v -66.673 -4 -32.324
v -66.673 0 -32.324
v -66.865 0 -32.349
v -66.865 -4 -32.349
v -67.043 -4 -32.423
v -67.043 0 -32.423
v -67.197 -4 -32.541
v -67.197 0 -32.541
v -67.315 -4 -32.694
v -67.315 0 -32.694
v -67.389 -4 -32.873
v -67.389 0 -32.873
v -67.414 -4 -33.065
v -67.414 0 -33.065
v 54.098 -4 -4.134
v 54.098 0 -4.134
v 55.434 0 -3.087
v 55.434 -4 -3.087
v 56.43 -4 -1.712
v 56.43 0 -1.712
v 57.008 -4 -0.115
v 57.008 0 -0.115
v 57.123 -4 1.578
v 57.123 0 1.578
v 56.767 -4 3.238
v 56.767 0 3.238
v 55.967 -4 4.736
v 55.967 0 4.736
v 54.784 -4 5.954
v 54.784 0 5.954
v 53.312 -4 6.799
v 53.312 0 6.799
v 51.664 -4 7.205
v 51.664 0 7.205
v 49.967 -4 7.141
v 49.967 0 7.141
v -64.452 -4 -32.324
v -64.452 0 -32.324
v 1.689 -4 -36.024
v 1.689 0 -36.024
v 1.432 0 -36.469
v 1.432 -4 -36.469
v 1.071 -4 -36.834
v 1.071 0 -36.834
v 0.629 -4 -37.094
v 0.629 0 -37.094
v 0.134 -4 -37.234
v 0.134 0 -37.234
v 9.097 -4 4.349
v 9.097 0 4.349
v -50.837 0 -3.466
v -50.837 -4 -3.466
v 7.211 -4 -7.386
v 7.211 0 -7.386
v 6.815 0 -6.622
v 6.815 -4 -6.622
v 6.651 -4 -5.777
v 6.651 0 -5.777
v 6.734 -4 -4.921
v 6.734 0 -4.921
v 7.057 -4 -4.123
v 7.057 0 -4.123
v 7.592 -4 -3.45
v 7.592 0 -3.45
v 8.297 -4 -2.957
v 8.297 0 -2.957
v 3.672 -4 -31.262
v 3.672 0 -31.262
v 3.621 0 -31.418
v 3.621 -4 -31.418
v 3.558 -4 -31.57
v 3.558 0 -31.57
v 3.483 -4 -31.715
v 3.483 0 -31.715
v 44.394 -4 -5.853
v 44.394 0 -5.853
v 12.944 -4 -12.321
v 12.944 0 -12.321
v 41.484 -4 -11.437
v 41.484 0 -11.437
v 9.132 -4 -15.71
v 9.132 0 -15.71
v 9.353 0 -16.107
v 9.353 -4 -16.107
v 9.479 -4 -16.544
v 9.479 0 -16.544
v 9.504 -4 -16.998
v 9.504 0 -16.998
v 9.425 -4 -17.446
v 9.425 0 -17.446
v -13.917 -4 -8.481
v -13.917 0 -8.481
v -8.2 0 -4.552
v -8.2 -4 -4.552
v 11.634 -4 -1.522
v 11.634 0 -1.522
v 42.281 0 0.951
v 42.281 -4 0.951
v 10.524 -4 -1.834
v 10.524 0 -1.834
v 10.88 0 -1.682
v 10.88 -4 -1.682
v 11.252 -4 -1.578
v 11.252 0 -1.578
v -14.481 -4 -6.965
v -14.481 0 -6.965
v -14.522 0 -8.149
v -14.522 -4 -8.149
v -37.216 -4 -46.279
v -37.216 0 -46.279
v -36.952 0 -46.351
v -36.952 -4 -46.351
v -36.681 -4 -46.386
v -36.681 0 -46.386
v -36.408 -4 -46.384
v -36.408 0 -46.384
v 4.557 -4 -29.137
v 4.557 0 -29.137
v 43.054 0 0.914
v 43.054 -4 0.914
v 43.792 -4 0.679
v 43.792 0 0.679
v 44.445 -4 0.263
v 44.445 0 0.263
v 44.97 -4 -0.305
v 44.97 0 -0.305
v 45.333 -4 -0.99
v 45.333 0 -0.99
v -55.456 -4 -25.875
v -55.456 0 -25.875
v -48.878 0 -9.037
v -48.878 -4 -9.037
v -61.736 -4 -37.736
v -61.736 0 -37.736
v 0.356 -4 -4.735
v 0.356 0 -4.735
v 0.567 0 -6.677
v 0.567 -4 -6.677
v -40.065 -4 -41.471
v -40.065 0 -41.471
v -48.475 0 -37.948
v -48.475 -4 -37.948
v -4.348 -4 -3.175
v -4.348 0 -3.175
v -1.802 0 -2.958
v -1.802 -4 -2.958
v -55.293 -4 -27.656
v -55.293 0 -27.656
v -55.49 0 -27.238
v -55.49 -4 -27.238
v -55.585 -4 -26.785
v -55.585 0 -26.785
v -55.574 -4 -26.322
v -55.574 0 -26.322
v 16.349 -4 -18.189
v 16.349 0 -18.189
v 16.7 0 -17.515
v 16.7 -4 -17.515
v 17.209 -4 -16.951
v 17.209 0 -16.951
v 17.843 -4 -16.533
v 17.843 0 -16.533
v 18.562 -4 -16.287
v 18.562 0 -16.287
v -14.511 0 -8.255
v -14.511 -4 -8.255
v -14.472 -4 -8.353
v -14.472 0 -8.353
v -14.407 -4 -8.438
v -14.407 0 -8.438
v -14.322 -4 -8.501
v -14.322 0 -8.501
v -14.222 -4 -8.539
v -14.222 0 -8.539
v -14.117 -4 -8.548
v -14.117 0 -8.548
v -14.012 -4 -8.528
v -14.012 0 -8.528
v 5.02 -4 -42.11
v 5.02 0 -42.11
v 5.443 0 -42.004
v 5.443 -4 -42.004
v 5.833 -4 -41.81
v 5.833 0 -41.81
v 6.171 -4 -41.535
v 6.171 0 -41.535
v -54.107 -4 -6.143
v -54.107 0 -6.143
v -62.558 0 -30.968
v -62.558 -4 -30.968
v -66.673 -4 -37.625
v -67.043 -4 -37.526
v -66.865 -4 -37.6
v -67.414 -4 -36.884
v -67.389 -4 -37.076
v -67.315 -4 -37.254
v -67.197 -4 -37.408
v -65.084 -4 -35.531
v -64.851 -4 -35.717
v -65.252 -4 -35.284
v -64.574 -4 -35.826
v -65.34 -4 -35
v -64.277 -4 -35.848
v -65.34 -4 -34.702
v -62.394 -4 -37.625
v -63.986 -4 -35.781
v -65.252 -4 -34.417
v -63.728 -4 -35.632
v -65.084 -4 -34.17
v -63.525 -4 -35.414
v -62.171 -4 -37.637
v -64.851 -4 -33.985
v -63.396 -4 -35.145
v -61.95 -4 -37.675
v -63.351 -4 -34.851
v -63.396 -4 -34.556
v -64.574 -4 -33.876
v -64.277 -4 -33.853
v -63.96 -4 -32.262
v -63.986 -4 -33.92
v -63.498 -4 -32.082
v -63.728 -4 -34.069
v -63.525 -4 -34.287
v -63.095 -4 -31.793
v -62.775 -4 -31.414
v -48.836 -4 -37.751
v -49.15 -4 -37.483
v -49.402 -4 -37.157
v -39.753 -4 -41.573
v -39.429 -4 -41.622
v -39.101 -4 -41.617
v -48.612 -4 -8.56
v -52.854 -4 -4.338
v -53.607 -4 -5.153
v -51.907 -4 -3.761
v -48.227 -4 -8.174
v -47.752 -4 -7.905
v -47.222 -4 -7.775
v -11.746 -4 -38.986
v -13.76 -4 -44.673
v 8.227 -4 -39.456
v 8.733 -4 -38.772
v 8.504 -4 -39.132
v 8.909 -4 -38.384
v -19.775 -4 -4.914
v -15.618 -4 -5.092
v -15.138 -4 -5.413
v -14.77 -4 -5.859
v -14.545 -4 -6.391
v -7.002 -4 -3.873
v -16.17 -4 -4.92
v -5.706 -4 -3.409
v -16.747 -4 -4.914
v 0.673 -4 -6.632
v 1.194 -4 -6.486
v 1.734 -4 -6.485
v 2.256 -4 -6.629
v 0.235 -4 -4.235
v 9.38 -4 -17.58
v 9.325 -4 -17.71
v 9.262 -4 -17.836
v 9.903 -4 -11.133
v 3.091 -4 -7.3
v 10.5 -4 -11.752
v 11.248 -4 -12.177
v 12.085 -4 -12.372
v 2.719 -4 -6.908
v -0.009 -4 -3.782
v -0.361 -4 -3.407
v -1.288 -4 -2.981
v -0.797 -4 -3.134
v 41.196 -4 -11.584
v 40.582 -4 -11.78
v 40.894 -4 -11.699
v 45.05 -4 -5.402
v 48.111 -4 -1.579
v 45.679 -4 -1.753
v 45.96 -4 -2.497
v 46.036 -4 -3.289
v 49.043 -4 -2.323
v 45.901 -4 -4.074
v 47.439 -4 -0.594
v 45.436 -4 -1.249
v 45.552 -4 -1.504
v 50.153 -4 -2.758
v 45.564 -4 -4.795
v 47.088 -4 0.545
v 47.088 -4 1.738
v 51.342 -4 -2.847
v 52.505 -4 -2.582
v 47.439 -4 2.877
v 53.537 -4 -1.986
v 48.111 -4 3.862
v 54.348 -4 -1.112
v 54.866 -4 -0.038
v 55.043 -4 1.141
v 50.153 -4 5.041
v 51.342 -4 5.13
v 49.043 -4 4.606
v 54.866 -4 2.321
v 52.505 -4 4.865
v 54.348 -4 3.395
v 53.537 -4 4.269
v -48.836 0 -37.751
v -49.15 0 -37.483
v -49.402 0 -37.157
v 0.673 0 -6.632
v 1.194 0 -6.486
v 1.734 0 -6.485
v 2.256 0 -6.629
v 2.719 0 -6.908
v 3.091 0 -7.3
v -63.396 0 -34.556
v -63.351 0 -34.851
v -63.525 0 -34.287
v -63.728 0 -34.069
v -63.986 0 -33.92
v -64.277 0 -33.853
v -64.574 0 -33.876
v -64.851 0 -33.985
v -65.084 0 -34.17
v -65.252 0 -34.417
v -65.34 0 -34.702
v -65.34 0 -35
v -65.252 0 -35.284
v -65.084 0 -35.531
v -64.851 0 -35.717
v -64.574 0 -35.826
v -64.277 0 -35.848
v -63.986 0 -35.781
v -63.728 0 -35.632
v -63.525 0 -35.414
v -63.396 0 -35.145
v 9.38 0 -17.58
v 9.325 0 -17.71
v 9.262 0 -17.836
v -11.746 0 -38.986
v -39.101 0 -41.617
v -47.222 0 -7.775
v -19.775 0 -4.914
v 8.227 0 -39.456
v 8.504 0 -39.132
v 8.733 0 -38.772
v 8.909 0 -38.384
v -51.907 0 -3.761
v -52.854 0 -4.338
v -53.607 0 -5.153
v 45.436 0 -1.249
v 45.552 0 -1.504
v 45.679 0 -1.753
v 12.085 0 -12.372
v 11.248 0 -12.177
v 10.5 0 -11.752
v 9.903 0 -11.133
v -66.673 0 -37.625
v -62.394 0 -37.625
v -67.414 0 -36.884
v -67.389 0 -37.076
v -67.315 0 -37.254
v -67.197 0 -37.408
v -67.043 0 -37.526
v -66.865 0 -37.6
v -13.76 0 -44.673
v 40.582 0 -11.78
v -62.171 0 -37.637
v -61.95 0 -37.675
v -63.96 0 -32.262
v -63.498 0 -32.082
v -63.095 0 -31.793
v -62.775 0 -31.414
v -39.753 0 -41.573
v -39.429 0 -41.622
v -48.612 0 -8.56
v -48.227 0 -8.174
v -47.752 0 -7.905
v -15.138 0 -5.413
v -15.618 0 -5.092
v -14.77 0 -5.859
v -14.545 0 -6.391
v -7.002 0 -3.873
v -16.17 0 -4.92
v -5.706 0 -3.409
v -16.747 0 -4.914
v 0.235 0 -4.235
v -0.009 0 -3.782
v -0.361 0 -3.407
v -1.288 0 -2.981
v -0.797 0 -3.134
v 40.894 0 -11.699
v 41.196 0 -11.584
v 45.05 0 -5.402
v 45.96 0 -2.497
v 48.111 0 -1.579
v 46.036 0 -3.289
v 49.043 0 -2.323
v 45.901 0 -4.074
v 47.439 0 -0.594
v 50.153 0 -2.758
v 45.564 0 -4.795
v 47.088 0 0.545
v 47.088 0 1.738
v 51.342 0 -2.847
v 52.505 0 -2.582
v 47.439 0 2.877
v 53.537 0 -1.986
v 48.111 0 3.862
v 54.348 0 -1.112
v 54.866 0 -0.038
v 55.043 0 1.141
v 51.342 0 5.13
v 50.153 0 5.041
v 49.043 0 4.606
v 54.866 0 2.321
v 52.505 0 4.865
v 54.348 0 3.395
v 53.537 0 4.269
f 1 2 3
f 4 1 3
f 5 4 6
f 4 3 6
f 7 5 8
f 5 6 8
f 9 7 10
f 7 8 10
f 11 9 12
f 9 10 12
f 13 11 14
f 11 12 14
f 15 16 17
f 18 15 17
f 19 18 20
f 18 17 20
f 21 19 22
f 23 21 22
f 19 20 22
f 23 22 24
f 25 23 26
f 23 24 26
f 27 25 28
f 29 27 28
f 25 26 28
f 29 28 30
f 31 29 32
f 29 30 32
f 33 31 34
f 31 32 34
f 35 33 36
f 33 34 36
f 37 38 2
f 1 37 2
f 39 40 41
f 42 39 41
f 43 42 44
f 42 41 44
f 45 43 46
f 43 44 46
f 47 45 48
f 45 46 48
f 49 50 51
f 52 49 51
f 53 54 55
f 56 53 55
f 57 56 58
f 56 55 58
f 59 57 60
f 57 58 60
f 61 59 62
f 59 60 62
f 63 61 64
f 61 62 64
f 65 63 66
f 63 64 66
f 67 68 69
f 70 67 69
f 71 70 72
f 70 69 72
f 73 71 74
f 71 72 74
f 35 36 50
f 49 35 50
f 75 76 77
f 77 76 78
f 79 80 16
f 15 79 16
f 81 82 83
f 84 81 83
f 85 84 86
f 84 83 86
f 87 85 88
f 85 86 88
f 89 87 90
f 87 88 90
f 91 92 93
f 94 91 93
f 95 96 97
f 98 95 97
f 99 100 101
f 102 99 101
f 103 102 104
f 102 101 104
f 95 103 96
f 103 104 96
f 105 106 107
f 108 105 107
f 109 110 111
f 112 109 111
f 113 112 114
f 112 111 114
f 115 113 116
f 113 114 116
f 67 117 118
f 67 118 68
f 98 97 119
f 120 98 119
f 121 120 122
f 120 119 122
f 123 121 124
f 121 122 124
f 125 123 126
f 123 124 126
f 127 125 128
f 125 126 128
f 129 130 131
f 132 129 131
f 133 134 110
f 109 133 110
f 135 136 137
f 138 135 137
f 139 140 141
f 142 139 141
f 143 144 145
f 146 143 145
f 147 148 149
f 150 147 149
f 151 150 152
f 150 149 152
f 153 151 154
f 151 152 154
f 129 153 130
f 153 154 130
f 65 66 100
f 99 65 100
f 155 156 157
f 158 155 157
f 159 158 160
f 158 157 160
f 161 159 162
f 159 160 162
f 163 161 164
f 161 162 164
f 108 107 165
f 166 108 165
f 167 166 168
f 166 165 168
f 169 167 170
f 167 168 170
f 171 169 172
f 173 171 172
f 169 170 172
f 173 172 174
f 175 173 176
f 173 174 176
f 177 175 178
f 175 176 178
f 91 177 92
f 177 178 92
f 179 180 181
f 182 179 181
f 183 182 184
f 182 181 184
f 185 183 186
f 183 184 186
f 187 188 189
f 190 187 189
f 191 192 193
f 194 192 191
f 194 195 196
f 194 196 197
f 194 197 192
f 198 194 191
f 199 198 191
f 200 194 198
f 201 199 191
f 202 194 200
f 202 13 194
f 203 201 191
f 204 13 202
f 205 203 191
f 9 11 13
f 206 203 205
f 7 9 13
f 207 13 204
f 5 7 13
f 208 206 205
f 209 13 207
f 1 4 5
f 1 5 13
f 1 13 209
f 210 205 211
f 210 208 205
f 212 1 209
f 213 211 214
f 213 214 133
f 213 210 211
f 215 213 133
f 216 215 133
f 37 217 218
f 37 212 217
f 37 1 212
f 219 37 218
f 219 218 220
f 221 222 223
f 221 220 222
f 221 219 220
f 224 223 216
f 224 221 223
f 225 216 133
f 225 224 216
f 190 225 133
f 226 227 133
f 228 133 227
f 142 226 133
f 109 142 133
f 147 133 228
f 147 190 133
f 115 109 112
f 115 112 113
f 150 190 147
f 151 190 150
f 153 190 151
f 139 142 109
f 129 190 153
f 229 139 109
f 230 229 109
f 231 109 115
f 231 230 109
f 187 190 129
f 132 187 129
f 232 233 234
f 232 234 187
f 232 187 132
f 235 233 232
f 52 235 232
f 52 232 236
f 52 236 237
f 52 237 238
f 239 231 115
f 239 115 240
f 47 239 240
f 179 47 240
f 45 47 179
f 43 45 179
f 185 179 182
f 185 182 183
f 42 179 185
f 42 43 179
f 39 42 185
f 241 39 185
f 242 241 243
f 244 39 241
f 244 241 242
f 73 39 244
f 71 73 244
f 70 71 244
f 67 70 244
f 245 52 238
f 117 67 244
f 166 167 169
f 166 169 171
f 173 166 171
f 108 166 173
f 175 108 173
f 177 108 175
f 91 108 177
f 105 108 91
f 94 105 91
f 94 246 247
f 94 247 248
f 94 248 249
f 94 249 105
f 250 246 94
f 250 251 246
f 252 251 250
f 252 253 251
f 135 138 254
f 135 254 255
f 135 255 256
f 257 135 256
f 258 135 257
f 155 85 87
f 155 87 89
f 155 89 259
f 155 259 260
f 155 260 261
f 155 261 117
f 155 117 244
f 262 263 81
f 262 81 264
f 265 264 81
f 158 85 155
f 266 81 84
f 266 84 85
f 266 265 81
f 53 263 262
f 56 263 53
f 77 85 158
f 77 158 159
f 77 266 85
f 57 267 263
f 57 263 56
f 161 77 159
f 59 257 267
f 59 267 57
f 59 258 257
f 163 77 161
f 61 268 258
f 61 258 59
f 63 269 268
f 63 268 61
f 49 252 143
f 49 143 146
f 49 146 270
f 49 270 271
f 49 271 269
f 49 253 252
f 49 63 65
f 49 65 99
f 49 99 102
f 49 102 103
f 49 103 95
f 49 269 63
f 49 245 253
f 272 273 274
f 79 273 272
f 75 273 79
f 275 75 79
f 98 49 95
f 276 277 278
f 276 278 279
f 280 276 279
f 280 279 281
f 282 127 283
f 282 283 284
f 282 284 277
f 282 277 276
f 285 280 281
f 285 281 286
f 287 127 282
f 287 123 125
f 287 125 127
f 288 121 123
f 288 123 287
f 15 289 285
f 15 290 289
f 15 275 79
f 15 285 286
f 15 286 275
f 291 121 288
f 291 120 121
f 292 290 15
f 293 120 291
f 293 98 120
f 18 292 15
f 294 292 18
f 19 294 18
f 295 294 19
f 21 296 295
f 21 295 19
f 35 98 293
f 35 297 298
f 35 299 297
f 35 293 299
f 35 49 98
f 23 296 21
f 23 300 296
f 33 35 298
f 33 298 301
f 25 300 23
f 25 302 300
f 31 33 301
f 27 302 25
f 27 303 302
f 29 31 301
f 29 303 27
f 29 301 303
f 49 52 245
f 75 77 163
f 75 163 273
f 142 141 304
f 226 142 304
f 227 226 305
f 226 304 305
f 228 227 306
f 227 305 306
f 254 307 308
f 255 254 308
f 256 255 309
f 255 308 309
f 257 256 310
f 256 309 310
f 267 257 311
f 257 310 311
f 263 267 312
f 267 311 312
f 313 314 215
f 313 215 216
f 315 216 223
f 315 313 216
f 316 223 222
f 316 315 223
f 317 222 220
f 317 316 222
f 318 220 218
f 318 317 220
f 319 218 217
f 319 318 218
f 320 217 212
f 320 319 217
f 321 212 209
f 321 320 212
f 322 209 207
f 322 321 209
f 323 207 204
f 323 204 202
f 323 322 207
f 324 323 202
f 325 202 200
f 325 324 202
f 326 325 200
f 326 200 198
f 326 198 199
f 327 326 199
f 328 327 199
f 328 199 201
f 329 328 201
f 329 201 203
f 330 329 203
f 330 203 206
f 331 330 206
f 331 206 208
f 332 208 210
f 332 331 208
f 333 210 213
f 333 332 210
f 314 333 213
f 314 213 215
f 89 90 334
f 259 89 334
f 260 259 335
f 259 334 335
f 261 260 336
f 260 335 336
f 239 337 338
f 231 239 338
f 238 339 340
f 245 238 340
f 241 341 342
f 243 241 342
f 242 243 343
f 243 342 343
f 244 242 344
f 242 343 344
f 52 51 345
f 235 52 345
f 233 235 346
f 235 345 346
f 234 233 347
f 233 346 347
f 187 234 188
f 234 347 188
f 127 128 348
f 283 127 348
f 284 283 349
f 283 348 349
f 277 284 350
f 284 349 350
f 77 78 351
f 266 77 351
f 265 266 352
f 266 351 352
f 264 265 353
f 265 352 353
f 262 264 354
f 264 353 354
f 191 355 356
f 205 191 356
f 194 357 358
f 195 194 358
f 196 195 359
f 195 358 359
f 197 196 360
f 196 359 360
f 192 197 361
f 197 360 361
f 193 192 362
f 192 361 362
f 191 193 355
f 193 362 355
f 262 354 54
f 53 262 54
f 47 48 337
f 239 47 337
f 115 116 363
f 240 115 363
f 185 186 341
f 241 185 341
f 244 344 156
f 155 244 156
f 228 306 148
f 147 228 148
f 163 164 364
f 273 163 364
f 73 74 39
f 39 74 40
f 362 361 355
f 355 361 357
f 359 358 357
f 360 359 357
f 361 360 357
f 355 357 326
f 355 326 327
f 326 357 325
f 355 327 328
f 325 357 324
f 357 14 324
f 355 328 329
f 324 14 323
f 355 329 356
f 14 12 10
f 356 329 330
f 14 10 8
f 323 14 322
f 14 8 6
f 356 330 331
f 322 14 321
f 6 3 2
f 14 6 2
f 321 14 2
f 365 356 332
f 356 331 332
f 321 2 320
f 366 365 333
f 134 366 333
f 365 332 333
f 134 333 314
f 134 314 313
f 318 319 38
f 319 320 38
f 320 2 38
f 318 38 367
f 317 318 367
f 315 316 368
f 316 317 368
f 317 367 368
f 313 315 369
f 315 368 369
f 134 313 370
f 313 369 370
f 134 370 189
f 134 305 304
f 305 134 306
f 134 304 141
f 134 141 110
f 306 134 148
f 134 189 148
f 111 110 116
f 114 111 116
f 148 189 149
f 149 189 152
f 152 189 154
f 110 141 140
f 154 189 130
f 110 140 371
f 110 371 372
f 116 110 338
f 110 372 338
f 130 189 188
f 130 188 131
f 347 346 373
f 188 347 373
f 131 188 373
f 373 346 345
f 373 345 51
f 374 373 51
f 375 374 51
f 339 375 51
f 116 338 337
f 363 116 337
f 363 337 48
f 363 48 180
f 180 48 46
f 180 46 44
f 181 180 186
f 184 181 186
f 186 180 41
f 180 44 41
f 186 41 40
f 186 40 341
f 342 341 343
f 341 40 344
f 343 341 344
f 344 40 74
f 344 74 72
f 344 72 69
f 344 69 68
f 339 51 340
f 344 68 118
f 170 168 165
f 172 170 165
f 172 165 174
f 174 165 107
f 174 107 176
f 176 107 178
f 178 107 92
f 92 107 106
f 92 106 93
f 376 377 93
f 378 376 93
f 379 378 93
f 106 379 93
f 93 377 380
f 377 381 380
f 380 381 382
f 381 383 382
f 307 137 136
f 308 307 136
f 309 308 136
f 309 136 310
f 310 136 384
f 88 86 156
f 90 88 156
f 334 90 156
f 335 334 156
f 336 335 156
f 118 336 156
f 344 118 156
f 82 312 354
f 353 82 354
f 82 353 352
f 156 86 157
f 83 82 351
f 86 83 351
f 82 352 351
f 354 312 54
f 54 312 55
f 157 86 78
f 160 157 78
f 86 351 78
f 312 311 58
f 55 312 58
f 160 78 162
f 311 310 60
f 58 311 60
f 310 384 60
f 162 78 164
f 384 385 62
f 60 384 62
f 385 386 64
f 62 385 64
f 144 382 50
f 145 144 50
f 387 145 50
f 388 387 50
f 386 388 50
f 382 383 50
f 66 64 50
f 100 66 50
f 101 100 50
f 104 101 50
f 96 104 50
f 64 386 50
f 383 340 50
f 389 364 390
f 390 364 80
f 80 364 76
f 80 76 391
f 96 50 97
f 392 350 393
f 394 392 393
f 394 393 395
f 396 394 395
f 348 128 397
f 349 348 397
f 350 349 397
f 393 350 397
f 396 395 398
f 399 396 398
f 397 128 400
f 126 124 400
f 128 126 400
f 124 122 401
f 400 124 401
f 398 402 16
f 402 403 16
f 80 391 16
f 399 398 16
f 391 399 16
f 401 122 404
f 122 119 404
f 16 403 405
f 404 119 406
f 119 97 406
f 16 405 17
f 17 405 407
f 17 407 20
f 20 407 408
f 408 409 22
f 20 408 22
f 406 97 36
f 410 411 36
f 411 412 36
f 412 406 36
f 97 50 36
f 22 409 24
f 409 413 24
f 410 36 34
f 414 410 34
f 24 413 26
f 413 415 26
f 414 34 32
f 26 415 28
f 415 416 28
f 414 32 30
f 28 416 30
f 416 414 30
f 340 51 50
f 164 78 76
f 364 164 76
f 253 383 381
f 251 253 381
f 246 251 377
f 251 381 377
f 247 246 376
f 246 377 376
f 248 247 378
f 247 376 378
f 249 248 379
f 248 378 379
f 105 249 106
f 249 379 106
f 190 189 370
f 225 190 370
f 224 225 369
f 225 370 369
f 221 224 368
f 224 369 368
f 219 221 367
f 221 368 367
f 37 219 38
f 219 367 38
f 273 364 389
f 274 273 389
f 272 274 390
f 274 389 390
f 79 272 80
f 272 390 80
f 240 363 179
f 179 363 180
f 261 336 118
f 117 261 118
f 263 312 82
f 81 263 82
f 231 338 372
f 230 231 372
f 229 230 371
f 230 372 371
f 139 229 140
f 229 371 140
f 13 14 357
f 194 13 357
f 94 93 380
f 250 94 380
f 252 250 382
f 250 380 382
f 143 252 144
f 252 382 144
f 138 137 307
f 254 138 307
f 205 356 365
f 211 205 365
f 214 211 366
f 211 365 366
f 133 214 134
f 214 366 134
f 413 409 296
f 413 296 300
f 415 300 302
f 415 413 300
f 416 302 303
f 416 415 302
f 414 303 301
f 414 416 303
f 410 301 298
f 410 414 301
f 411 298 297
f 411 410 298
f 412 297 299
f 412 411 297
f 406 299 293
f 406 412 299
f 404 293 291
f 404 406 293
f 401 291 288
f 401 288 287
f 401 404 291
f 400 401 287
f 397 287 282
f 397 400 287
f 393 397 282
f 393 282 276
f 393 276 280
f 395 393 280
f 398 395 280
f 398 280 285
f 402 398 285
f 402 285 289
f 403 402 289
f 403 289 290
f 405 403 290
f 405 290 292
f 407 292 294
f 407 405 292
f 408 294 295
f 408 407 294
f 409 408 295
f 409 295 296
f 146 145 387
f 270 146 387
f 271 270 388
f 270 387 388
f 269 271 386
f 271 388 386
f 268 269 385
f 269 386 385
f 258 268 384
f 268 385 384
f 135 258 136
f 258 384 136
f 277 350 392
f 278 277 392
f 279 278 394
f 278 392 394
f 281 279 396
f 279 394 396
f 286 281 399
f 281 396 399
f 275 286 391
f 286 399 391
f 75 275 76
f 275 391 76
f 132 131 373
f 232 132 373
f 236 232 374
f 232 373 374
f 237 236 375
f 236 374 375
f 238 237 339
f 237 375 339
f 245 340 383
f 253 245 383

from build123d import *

# Parameters (mm, degrees)
F1_R     = 1
F1_R_2   = 4
F2_DEPTH = 4


# Not quite as in the source:
# - a feature names something its author has since deleted; it is built from what else it names


with BuildPart() as f2:
    # F1 (on Front) → F2 (new body)
    with BuildSketch(Plane.XZ):
        with BuildLine():
            ThreePointArc((54.0977004839, -4.1335701552), (56.766858502, 3.238282099), (49.9672364551, 7.1413258089))
            Line((49.9672364551, 7.1413258089), (9.0970295176, 4.3491148777))
            Line((9.0970295176, 4.3491148777), (-50.8374237274, -3.466212469))
            ThreePointArc((-50.8374237274, -3.466212469), (-52.8544943464, -4.3378942821), (-54.1067810637, -6.1434914253))
            Line((-54.1067810637, -6.1434914253), (-62.5583549212, -30.968136056))
            ThreePointArc((-62.5583549212, -30.968136056), (-63.2874110026, -31.9497789492), (-64.4516400514, -32.3235653341))
            Line((-64.4516400514, -32.3235653341), (-66.6727852076, -32.3235653341))
            ThreePointArc((-66.6727852076, -32.3235653341), (-67.1968351707, -32.5406339362), (-67.4139037728, -33.0646838993))
            Line((-67.4139037728, -33.0646838993), (-67.4139037728, -36.8838813156))
            ThreePointArc((-67.4139037728, -36.8838813156), (-67.1968351707, -37.4079312787), (-66.6727852076, -37.6249998808))
            Line((-66.6727852076, -37.6249998808), (-62.3935461021, -37.6249998808))
            ThreePointArc((-62.3935461021, -37.6249998808), (-62.0598715448, -37.6530309942), (-61.7355502568, -37.736338591))
            Line((-61.7355502568, -37.736338591), (-37.2162681051, -46.2786780104))
            ThreePointArc((-37.2162681051, -46.2786780104), (-36.8173856222, -46.3731607561), (-36.4076181612, -46.3843344843))
            Line((-36.4076181612, -46.3843344843), (-13.7597462162, -44.6734763682))
            Line((-13.7597462162, -44.6734763682), (5.0197247755, -42.1101055891))
            ThreePointArc((5.0197247755, -42.1101055891), (5.6431122997, -41.9176107253), (6.1713765615, -41.5347228206))
            Line((6.1713765615, -41.5347228206), (8.2269536442, -39.4559054448))
            ThreePointArc((8.2269536442, -39.4559054448), (8.625280402, -38.9562994549), (8.9087680688, -38.3836694749))
            Line((8.9087680688, -38.3836694749), (16.3488967626, -18.1892685938))
            ThreePointArc((16.3488967626, -18.1892685938), (17.208766797, -16.9510123668), (18.5623472371, -16.2873294968))
            Line((18.5623472371, -16.2873294968), (40.5820753294, -11.7802791422))
            ThreePointArc((40.5820753294, -11.7802791422), (41.0467937044, -11.6453208131), (41.4837674916, -11.4374005686))
            Line((41.4837674916, -11.4374005686), (54.0977004839, -4.1335701552))
        make_face()
        with Locations((-64.3514022231, -34.8506011069)):
            Circle(F1_R, mode=Mode.SUBTRACT)
        with BuildLine():
            ThreePointArc((-16.7472230261, -4.91411715), (-15.1379574632, -5.4133219884), (-14.4811960302, -6.9649680637))
            Line((-14.4811960302, -6.9649680637), (-14.5219445245, -8.1491333606))
            ThreePointArc((-14.5219445245, -8.1491333606), (-14.32171034, -8.5009617779), (-13.9174035461, -8.4806398607))
            Line((-13.9174035461, -8.4806398607), (-8.2003281839, -4.5523469385))
            ThreePointArc((-8.2003281839, -4.5523469385), (-6.3639342341, -3.6131535453), (-4.348447762, -3.1747002983))
            Line((-4.348447762, -3.1747002983), (-1.8018096929, -2.9578907207))
            ThreePointArc((-1.8018096929, -2.9578907207), (-0.3607692656, -3.4067953543), (0.3561826933, -4.7349868962))
            Line((0.3561826933, -4.7349868962), (0.5668963829, -6.67740348))
            Line((0.5668963829, -6.67740348), (0.672921323, -6.6315499412))
            ThreePointArc((0.672921323, -6.6315499412), (1.9999899765, -6.5396114649), (3.091186979, -7.3004353579))
            Line((3.091186979, -7.3004353579), (9.1316822834, -15.7097849605))
            ThreePointArc((9.1316822834, -15.7097849605), (9.4794348377, -16.5438272503), (9.4245987558, -17.4457980836))
            ThreePointArc((9.4245987558, -17.4457980836), (9.3536544385, -17.6453573177), (9.2620047676, -17.8362953231))
            Line((9.2620047676, -17.8362953231), (4.5568440785, -29.1365425288))
            Line((4.5568440785, -29.1365425288), (3.6719114619, -31.2618593858))
            ThreePointArc((3.6719114619, -31.2618593858), (3.5914700409, -31.4944450482), (3.483071784, -31.715390133))
            Line((3.483071784, -31.715390133), (1.6890171815, -36.0241187498))
            ThreePointArc((1.6890171815, -36.0241187498), (1.0710114326, -36.8336930562), (0.1344541234, -37.2339455637))
            Line((0.1344541234, -37.2339455637), (-11.7459257638, -38.985923444))
            Line((-11.7459257638, -38.985923444), (-39.1007720975, -41.6174277811))
            ThreePointArc((-39.1007720975, -41.6174277811), (-39.5919940555, -41.6040344694), (-40.0651227377, -41.4712653355))
            Line((-40.0651227377, -41.4712653355), (-48.4746967713, -37.9479731273))
            ThreePointArc((-48.4746967713, -37.9479731273), (-48.9998078369, -37.6249470931), (-49.401585452, -37.1573337934))
            Line((-49.401585452, -37.1573337934), (-55.2931292161, -27.6564465473))
            ThreePointArc((-55.2931292161, -27.6564465473), (-55.5850730561, -26.7847906202), (-55.4562690933, -25.874612176))
            Line((-55.4562690933, -25.874612176), (-48.8776308187, -9.0366472667))
            ThreePointArc((-48.8776308187, -9.0366472667), (-48.2268856759, -8.1736364118), (-47.2221234757, -7.7752523038))
            Line((-47.2221234757, -7.7752523038), (-19.7747927159, -4.91411715))
            Line((-19.7747927159, -4.91411715), (-16.7472230261, -4.91411715))
        make_face(mode=Mode.SUBTRACT)
        with BuildLine():
            ThreePointArc((7.2113401452, -7.3855209262), (6.7341998146, -4.9209260348), (8.2972601063, -2.9565601324))
            Line((8.2972601063, -2.9565601324), (10.5244084197, -1.8336281786))
            ThreePointArc((10.5244084197, -1.8336281786), (11.0639592867, -1.6241164689), (11.6337015289, -1.5221161154))
            Line((11.6337015289, -1.5221161154), (42.2805400914, 0.9513819838))
            ThreePointArc((42.2805400914, 0.9513819838), (44.1319918409, 0.4924203394), (45.3325095049, -0.989901053))
            ThreePointArc((45.3325095049, -0.989901053), (45.4924194241, -1.3771741585), (45.6785557512, -1.752547184))
            ThreePointArc((45.6785557512, -1.752547184), (45.9010642846, -4.0736832448), (44.3940516522, -5.8530358197))
            Line((44.3940516522, -5.8530358197), (12.9439963939, -12.3211824174))
            ThreePointArc((12.9439963939, -12.3211824174), (11.2477431433, -12.1769167526), (9.9030954921, -11.132881137))
            Line((9.9030954921, -11.132881137), (7.2113401452, -7.3855209262))
        make_face(mode=Mode.SUBTRACT)
        with Locations((51.0432839383, 1.1414983302)):
            Circle(F1_R_2, mode=Mode.SUBTRACT)
    extrude(amount=F2_DEPTH)


solid = f2.part
